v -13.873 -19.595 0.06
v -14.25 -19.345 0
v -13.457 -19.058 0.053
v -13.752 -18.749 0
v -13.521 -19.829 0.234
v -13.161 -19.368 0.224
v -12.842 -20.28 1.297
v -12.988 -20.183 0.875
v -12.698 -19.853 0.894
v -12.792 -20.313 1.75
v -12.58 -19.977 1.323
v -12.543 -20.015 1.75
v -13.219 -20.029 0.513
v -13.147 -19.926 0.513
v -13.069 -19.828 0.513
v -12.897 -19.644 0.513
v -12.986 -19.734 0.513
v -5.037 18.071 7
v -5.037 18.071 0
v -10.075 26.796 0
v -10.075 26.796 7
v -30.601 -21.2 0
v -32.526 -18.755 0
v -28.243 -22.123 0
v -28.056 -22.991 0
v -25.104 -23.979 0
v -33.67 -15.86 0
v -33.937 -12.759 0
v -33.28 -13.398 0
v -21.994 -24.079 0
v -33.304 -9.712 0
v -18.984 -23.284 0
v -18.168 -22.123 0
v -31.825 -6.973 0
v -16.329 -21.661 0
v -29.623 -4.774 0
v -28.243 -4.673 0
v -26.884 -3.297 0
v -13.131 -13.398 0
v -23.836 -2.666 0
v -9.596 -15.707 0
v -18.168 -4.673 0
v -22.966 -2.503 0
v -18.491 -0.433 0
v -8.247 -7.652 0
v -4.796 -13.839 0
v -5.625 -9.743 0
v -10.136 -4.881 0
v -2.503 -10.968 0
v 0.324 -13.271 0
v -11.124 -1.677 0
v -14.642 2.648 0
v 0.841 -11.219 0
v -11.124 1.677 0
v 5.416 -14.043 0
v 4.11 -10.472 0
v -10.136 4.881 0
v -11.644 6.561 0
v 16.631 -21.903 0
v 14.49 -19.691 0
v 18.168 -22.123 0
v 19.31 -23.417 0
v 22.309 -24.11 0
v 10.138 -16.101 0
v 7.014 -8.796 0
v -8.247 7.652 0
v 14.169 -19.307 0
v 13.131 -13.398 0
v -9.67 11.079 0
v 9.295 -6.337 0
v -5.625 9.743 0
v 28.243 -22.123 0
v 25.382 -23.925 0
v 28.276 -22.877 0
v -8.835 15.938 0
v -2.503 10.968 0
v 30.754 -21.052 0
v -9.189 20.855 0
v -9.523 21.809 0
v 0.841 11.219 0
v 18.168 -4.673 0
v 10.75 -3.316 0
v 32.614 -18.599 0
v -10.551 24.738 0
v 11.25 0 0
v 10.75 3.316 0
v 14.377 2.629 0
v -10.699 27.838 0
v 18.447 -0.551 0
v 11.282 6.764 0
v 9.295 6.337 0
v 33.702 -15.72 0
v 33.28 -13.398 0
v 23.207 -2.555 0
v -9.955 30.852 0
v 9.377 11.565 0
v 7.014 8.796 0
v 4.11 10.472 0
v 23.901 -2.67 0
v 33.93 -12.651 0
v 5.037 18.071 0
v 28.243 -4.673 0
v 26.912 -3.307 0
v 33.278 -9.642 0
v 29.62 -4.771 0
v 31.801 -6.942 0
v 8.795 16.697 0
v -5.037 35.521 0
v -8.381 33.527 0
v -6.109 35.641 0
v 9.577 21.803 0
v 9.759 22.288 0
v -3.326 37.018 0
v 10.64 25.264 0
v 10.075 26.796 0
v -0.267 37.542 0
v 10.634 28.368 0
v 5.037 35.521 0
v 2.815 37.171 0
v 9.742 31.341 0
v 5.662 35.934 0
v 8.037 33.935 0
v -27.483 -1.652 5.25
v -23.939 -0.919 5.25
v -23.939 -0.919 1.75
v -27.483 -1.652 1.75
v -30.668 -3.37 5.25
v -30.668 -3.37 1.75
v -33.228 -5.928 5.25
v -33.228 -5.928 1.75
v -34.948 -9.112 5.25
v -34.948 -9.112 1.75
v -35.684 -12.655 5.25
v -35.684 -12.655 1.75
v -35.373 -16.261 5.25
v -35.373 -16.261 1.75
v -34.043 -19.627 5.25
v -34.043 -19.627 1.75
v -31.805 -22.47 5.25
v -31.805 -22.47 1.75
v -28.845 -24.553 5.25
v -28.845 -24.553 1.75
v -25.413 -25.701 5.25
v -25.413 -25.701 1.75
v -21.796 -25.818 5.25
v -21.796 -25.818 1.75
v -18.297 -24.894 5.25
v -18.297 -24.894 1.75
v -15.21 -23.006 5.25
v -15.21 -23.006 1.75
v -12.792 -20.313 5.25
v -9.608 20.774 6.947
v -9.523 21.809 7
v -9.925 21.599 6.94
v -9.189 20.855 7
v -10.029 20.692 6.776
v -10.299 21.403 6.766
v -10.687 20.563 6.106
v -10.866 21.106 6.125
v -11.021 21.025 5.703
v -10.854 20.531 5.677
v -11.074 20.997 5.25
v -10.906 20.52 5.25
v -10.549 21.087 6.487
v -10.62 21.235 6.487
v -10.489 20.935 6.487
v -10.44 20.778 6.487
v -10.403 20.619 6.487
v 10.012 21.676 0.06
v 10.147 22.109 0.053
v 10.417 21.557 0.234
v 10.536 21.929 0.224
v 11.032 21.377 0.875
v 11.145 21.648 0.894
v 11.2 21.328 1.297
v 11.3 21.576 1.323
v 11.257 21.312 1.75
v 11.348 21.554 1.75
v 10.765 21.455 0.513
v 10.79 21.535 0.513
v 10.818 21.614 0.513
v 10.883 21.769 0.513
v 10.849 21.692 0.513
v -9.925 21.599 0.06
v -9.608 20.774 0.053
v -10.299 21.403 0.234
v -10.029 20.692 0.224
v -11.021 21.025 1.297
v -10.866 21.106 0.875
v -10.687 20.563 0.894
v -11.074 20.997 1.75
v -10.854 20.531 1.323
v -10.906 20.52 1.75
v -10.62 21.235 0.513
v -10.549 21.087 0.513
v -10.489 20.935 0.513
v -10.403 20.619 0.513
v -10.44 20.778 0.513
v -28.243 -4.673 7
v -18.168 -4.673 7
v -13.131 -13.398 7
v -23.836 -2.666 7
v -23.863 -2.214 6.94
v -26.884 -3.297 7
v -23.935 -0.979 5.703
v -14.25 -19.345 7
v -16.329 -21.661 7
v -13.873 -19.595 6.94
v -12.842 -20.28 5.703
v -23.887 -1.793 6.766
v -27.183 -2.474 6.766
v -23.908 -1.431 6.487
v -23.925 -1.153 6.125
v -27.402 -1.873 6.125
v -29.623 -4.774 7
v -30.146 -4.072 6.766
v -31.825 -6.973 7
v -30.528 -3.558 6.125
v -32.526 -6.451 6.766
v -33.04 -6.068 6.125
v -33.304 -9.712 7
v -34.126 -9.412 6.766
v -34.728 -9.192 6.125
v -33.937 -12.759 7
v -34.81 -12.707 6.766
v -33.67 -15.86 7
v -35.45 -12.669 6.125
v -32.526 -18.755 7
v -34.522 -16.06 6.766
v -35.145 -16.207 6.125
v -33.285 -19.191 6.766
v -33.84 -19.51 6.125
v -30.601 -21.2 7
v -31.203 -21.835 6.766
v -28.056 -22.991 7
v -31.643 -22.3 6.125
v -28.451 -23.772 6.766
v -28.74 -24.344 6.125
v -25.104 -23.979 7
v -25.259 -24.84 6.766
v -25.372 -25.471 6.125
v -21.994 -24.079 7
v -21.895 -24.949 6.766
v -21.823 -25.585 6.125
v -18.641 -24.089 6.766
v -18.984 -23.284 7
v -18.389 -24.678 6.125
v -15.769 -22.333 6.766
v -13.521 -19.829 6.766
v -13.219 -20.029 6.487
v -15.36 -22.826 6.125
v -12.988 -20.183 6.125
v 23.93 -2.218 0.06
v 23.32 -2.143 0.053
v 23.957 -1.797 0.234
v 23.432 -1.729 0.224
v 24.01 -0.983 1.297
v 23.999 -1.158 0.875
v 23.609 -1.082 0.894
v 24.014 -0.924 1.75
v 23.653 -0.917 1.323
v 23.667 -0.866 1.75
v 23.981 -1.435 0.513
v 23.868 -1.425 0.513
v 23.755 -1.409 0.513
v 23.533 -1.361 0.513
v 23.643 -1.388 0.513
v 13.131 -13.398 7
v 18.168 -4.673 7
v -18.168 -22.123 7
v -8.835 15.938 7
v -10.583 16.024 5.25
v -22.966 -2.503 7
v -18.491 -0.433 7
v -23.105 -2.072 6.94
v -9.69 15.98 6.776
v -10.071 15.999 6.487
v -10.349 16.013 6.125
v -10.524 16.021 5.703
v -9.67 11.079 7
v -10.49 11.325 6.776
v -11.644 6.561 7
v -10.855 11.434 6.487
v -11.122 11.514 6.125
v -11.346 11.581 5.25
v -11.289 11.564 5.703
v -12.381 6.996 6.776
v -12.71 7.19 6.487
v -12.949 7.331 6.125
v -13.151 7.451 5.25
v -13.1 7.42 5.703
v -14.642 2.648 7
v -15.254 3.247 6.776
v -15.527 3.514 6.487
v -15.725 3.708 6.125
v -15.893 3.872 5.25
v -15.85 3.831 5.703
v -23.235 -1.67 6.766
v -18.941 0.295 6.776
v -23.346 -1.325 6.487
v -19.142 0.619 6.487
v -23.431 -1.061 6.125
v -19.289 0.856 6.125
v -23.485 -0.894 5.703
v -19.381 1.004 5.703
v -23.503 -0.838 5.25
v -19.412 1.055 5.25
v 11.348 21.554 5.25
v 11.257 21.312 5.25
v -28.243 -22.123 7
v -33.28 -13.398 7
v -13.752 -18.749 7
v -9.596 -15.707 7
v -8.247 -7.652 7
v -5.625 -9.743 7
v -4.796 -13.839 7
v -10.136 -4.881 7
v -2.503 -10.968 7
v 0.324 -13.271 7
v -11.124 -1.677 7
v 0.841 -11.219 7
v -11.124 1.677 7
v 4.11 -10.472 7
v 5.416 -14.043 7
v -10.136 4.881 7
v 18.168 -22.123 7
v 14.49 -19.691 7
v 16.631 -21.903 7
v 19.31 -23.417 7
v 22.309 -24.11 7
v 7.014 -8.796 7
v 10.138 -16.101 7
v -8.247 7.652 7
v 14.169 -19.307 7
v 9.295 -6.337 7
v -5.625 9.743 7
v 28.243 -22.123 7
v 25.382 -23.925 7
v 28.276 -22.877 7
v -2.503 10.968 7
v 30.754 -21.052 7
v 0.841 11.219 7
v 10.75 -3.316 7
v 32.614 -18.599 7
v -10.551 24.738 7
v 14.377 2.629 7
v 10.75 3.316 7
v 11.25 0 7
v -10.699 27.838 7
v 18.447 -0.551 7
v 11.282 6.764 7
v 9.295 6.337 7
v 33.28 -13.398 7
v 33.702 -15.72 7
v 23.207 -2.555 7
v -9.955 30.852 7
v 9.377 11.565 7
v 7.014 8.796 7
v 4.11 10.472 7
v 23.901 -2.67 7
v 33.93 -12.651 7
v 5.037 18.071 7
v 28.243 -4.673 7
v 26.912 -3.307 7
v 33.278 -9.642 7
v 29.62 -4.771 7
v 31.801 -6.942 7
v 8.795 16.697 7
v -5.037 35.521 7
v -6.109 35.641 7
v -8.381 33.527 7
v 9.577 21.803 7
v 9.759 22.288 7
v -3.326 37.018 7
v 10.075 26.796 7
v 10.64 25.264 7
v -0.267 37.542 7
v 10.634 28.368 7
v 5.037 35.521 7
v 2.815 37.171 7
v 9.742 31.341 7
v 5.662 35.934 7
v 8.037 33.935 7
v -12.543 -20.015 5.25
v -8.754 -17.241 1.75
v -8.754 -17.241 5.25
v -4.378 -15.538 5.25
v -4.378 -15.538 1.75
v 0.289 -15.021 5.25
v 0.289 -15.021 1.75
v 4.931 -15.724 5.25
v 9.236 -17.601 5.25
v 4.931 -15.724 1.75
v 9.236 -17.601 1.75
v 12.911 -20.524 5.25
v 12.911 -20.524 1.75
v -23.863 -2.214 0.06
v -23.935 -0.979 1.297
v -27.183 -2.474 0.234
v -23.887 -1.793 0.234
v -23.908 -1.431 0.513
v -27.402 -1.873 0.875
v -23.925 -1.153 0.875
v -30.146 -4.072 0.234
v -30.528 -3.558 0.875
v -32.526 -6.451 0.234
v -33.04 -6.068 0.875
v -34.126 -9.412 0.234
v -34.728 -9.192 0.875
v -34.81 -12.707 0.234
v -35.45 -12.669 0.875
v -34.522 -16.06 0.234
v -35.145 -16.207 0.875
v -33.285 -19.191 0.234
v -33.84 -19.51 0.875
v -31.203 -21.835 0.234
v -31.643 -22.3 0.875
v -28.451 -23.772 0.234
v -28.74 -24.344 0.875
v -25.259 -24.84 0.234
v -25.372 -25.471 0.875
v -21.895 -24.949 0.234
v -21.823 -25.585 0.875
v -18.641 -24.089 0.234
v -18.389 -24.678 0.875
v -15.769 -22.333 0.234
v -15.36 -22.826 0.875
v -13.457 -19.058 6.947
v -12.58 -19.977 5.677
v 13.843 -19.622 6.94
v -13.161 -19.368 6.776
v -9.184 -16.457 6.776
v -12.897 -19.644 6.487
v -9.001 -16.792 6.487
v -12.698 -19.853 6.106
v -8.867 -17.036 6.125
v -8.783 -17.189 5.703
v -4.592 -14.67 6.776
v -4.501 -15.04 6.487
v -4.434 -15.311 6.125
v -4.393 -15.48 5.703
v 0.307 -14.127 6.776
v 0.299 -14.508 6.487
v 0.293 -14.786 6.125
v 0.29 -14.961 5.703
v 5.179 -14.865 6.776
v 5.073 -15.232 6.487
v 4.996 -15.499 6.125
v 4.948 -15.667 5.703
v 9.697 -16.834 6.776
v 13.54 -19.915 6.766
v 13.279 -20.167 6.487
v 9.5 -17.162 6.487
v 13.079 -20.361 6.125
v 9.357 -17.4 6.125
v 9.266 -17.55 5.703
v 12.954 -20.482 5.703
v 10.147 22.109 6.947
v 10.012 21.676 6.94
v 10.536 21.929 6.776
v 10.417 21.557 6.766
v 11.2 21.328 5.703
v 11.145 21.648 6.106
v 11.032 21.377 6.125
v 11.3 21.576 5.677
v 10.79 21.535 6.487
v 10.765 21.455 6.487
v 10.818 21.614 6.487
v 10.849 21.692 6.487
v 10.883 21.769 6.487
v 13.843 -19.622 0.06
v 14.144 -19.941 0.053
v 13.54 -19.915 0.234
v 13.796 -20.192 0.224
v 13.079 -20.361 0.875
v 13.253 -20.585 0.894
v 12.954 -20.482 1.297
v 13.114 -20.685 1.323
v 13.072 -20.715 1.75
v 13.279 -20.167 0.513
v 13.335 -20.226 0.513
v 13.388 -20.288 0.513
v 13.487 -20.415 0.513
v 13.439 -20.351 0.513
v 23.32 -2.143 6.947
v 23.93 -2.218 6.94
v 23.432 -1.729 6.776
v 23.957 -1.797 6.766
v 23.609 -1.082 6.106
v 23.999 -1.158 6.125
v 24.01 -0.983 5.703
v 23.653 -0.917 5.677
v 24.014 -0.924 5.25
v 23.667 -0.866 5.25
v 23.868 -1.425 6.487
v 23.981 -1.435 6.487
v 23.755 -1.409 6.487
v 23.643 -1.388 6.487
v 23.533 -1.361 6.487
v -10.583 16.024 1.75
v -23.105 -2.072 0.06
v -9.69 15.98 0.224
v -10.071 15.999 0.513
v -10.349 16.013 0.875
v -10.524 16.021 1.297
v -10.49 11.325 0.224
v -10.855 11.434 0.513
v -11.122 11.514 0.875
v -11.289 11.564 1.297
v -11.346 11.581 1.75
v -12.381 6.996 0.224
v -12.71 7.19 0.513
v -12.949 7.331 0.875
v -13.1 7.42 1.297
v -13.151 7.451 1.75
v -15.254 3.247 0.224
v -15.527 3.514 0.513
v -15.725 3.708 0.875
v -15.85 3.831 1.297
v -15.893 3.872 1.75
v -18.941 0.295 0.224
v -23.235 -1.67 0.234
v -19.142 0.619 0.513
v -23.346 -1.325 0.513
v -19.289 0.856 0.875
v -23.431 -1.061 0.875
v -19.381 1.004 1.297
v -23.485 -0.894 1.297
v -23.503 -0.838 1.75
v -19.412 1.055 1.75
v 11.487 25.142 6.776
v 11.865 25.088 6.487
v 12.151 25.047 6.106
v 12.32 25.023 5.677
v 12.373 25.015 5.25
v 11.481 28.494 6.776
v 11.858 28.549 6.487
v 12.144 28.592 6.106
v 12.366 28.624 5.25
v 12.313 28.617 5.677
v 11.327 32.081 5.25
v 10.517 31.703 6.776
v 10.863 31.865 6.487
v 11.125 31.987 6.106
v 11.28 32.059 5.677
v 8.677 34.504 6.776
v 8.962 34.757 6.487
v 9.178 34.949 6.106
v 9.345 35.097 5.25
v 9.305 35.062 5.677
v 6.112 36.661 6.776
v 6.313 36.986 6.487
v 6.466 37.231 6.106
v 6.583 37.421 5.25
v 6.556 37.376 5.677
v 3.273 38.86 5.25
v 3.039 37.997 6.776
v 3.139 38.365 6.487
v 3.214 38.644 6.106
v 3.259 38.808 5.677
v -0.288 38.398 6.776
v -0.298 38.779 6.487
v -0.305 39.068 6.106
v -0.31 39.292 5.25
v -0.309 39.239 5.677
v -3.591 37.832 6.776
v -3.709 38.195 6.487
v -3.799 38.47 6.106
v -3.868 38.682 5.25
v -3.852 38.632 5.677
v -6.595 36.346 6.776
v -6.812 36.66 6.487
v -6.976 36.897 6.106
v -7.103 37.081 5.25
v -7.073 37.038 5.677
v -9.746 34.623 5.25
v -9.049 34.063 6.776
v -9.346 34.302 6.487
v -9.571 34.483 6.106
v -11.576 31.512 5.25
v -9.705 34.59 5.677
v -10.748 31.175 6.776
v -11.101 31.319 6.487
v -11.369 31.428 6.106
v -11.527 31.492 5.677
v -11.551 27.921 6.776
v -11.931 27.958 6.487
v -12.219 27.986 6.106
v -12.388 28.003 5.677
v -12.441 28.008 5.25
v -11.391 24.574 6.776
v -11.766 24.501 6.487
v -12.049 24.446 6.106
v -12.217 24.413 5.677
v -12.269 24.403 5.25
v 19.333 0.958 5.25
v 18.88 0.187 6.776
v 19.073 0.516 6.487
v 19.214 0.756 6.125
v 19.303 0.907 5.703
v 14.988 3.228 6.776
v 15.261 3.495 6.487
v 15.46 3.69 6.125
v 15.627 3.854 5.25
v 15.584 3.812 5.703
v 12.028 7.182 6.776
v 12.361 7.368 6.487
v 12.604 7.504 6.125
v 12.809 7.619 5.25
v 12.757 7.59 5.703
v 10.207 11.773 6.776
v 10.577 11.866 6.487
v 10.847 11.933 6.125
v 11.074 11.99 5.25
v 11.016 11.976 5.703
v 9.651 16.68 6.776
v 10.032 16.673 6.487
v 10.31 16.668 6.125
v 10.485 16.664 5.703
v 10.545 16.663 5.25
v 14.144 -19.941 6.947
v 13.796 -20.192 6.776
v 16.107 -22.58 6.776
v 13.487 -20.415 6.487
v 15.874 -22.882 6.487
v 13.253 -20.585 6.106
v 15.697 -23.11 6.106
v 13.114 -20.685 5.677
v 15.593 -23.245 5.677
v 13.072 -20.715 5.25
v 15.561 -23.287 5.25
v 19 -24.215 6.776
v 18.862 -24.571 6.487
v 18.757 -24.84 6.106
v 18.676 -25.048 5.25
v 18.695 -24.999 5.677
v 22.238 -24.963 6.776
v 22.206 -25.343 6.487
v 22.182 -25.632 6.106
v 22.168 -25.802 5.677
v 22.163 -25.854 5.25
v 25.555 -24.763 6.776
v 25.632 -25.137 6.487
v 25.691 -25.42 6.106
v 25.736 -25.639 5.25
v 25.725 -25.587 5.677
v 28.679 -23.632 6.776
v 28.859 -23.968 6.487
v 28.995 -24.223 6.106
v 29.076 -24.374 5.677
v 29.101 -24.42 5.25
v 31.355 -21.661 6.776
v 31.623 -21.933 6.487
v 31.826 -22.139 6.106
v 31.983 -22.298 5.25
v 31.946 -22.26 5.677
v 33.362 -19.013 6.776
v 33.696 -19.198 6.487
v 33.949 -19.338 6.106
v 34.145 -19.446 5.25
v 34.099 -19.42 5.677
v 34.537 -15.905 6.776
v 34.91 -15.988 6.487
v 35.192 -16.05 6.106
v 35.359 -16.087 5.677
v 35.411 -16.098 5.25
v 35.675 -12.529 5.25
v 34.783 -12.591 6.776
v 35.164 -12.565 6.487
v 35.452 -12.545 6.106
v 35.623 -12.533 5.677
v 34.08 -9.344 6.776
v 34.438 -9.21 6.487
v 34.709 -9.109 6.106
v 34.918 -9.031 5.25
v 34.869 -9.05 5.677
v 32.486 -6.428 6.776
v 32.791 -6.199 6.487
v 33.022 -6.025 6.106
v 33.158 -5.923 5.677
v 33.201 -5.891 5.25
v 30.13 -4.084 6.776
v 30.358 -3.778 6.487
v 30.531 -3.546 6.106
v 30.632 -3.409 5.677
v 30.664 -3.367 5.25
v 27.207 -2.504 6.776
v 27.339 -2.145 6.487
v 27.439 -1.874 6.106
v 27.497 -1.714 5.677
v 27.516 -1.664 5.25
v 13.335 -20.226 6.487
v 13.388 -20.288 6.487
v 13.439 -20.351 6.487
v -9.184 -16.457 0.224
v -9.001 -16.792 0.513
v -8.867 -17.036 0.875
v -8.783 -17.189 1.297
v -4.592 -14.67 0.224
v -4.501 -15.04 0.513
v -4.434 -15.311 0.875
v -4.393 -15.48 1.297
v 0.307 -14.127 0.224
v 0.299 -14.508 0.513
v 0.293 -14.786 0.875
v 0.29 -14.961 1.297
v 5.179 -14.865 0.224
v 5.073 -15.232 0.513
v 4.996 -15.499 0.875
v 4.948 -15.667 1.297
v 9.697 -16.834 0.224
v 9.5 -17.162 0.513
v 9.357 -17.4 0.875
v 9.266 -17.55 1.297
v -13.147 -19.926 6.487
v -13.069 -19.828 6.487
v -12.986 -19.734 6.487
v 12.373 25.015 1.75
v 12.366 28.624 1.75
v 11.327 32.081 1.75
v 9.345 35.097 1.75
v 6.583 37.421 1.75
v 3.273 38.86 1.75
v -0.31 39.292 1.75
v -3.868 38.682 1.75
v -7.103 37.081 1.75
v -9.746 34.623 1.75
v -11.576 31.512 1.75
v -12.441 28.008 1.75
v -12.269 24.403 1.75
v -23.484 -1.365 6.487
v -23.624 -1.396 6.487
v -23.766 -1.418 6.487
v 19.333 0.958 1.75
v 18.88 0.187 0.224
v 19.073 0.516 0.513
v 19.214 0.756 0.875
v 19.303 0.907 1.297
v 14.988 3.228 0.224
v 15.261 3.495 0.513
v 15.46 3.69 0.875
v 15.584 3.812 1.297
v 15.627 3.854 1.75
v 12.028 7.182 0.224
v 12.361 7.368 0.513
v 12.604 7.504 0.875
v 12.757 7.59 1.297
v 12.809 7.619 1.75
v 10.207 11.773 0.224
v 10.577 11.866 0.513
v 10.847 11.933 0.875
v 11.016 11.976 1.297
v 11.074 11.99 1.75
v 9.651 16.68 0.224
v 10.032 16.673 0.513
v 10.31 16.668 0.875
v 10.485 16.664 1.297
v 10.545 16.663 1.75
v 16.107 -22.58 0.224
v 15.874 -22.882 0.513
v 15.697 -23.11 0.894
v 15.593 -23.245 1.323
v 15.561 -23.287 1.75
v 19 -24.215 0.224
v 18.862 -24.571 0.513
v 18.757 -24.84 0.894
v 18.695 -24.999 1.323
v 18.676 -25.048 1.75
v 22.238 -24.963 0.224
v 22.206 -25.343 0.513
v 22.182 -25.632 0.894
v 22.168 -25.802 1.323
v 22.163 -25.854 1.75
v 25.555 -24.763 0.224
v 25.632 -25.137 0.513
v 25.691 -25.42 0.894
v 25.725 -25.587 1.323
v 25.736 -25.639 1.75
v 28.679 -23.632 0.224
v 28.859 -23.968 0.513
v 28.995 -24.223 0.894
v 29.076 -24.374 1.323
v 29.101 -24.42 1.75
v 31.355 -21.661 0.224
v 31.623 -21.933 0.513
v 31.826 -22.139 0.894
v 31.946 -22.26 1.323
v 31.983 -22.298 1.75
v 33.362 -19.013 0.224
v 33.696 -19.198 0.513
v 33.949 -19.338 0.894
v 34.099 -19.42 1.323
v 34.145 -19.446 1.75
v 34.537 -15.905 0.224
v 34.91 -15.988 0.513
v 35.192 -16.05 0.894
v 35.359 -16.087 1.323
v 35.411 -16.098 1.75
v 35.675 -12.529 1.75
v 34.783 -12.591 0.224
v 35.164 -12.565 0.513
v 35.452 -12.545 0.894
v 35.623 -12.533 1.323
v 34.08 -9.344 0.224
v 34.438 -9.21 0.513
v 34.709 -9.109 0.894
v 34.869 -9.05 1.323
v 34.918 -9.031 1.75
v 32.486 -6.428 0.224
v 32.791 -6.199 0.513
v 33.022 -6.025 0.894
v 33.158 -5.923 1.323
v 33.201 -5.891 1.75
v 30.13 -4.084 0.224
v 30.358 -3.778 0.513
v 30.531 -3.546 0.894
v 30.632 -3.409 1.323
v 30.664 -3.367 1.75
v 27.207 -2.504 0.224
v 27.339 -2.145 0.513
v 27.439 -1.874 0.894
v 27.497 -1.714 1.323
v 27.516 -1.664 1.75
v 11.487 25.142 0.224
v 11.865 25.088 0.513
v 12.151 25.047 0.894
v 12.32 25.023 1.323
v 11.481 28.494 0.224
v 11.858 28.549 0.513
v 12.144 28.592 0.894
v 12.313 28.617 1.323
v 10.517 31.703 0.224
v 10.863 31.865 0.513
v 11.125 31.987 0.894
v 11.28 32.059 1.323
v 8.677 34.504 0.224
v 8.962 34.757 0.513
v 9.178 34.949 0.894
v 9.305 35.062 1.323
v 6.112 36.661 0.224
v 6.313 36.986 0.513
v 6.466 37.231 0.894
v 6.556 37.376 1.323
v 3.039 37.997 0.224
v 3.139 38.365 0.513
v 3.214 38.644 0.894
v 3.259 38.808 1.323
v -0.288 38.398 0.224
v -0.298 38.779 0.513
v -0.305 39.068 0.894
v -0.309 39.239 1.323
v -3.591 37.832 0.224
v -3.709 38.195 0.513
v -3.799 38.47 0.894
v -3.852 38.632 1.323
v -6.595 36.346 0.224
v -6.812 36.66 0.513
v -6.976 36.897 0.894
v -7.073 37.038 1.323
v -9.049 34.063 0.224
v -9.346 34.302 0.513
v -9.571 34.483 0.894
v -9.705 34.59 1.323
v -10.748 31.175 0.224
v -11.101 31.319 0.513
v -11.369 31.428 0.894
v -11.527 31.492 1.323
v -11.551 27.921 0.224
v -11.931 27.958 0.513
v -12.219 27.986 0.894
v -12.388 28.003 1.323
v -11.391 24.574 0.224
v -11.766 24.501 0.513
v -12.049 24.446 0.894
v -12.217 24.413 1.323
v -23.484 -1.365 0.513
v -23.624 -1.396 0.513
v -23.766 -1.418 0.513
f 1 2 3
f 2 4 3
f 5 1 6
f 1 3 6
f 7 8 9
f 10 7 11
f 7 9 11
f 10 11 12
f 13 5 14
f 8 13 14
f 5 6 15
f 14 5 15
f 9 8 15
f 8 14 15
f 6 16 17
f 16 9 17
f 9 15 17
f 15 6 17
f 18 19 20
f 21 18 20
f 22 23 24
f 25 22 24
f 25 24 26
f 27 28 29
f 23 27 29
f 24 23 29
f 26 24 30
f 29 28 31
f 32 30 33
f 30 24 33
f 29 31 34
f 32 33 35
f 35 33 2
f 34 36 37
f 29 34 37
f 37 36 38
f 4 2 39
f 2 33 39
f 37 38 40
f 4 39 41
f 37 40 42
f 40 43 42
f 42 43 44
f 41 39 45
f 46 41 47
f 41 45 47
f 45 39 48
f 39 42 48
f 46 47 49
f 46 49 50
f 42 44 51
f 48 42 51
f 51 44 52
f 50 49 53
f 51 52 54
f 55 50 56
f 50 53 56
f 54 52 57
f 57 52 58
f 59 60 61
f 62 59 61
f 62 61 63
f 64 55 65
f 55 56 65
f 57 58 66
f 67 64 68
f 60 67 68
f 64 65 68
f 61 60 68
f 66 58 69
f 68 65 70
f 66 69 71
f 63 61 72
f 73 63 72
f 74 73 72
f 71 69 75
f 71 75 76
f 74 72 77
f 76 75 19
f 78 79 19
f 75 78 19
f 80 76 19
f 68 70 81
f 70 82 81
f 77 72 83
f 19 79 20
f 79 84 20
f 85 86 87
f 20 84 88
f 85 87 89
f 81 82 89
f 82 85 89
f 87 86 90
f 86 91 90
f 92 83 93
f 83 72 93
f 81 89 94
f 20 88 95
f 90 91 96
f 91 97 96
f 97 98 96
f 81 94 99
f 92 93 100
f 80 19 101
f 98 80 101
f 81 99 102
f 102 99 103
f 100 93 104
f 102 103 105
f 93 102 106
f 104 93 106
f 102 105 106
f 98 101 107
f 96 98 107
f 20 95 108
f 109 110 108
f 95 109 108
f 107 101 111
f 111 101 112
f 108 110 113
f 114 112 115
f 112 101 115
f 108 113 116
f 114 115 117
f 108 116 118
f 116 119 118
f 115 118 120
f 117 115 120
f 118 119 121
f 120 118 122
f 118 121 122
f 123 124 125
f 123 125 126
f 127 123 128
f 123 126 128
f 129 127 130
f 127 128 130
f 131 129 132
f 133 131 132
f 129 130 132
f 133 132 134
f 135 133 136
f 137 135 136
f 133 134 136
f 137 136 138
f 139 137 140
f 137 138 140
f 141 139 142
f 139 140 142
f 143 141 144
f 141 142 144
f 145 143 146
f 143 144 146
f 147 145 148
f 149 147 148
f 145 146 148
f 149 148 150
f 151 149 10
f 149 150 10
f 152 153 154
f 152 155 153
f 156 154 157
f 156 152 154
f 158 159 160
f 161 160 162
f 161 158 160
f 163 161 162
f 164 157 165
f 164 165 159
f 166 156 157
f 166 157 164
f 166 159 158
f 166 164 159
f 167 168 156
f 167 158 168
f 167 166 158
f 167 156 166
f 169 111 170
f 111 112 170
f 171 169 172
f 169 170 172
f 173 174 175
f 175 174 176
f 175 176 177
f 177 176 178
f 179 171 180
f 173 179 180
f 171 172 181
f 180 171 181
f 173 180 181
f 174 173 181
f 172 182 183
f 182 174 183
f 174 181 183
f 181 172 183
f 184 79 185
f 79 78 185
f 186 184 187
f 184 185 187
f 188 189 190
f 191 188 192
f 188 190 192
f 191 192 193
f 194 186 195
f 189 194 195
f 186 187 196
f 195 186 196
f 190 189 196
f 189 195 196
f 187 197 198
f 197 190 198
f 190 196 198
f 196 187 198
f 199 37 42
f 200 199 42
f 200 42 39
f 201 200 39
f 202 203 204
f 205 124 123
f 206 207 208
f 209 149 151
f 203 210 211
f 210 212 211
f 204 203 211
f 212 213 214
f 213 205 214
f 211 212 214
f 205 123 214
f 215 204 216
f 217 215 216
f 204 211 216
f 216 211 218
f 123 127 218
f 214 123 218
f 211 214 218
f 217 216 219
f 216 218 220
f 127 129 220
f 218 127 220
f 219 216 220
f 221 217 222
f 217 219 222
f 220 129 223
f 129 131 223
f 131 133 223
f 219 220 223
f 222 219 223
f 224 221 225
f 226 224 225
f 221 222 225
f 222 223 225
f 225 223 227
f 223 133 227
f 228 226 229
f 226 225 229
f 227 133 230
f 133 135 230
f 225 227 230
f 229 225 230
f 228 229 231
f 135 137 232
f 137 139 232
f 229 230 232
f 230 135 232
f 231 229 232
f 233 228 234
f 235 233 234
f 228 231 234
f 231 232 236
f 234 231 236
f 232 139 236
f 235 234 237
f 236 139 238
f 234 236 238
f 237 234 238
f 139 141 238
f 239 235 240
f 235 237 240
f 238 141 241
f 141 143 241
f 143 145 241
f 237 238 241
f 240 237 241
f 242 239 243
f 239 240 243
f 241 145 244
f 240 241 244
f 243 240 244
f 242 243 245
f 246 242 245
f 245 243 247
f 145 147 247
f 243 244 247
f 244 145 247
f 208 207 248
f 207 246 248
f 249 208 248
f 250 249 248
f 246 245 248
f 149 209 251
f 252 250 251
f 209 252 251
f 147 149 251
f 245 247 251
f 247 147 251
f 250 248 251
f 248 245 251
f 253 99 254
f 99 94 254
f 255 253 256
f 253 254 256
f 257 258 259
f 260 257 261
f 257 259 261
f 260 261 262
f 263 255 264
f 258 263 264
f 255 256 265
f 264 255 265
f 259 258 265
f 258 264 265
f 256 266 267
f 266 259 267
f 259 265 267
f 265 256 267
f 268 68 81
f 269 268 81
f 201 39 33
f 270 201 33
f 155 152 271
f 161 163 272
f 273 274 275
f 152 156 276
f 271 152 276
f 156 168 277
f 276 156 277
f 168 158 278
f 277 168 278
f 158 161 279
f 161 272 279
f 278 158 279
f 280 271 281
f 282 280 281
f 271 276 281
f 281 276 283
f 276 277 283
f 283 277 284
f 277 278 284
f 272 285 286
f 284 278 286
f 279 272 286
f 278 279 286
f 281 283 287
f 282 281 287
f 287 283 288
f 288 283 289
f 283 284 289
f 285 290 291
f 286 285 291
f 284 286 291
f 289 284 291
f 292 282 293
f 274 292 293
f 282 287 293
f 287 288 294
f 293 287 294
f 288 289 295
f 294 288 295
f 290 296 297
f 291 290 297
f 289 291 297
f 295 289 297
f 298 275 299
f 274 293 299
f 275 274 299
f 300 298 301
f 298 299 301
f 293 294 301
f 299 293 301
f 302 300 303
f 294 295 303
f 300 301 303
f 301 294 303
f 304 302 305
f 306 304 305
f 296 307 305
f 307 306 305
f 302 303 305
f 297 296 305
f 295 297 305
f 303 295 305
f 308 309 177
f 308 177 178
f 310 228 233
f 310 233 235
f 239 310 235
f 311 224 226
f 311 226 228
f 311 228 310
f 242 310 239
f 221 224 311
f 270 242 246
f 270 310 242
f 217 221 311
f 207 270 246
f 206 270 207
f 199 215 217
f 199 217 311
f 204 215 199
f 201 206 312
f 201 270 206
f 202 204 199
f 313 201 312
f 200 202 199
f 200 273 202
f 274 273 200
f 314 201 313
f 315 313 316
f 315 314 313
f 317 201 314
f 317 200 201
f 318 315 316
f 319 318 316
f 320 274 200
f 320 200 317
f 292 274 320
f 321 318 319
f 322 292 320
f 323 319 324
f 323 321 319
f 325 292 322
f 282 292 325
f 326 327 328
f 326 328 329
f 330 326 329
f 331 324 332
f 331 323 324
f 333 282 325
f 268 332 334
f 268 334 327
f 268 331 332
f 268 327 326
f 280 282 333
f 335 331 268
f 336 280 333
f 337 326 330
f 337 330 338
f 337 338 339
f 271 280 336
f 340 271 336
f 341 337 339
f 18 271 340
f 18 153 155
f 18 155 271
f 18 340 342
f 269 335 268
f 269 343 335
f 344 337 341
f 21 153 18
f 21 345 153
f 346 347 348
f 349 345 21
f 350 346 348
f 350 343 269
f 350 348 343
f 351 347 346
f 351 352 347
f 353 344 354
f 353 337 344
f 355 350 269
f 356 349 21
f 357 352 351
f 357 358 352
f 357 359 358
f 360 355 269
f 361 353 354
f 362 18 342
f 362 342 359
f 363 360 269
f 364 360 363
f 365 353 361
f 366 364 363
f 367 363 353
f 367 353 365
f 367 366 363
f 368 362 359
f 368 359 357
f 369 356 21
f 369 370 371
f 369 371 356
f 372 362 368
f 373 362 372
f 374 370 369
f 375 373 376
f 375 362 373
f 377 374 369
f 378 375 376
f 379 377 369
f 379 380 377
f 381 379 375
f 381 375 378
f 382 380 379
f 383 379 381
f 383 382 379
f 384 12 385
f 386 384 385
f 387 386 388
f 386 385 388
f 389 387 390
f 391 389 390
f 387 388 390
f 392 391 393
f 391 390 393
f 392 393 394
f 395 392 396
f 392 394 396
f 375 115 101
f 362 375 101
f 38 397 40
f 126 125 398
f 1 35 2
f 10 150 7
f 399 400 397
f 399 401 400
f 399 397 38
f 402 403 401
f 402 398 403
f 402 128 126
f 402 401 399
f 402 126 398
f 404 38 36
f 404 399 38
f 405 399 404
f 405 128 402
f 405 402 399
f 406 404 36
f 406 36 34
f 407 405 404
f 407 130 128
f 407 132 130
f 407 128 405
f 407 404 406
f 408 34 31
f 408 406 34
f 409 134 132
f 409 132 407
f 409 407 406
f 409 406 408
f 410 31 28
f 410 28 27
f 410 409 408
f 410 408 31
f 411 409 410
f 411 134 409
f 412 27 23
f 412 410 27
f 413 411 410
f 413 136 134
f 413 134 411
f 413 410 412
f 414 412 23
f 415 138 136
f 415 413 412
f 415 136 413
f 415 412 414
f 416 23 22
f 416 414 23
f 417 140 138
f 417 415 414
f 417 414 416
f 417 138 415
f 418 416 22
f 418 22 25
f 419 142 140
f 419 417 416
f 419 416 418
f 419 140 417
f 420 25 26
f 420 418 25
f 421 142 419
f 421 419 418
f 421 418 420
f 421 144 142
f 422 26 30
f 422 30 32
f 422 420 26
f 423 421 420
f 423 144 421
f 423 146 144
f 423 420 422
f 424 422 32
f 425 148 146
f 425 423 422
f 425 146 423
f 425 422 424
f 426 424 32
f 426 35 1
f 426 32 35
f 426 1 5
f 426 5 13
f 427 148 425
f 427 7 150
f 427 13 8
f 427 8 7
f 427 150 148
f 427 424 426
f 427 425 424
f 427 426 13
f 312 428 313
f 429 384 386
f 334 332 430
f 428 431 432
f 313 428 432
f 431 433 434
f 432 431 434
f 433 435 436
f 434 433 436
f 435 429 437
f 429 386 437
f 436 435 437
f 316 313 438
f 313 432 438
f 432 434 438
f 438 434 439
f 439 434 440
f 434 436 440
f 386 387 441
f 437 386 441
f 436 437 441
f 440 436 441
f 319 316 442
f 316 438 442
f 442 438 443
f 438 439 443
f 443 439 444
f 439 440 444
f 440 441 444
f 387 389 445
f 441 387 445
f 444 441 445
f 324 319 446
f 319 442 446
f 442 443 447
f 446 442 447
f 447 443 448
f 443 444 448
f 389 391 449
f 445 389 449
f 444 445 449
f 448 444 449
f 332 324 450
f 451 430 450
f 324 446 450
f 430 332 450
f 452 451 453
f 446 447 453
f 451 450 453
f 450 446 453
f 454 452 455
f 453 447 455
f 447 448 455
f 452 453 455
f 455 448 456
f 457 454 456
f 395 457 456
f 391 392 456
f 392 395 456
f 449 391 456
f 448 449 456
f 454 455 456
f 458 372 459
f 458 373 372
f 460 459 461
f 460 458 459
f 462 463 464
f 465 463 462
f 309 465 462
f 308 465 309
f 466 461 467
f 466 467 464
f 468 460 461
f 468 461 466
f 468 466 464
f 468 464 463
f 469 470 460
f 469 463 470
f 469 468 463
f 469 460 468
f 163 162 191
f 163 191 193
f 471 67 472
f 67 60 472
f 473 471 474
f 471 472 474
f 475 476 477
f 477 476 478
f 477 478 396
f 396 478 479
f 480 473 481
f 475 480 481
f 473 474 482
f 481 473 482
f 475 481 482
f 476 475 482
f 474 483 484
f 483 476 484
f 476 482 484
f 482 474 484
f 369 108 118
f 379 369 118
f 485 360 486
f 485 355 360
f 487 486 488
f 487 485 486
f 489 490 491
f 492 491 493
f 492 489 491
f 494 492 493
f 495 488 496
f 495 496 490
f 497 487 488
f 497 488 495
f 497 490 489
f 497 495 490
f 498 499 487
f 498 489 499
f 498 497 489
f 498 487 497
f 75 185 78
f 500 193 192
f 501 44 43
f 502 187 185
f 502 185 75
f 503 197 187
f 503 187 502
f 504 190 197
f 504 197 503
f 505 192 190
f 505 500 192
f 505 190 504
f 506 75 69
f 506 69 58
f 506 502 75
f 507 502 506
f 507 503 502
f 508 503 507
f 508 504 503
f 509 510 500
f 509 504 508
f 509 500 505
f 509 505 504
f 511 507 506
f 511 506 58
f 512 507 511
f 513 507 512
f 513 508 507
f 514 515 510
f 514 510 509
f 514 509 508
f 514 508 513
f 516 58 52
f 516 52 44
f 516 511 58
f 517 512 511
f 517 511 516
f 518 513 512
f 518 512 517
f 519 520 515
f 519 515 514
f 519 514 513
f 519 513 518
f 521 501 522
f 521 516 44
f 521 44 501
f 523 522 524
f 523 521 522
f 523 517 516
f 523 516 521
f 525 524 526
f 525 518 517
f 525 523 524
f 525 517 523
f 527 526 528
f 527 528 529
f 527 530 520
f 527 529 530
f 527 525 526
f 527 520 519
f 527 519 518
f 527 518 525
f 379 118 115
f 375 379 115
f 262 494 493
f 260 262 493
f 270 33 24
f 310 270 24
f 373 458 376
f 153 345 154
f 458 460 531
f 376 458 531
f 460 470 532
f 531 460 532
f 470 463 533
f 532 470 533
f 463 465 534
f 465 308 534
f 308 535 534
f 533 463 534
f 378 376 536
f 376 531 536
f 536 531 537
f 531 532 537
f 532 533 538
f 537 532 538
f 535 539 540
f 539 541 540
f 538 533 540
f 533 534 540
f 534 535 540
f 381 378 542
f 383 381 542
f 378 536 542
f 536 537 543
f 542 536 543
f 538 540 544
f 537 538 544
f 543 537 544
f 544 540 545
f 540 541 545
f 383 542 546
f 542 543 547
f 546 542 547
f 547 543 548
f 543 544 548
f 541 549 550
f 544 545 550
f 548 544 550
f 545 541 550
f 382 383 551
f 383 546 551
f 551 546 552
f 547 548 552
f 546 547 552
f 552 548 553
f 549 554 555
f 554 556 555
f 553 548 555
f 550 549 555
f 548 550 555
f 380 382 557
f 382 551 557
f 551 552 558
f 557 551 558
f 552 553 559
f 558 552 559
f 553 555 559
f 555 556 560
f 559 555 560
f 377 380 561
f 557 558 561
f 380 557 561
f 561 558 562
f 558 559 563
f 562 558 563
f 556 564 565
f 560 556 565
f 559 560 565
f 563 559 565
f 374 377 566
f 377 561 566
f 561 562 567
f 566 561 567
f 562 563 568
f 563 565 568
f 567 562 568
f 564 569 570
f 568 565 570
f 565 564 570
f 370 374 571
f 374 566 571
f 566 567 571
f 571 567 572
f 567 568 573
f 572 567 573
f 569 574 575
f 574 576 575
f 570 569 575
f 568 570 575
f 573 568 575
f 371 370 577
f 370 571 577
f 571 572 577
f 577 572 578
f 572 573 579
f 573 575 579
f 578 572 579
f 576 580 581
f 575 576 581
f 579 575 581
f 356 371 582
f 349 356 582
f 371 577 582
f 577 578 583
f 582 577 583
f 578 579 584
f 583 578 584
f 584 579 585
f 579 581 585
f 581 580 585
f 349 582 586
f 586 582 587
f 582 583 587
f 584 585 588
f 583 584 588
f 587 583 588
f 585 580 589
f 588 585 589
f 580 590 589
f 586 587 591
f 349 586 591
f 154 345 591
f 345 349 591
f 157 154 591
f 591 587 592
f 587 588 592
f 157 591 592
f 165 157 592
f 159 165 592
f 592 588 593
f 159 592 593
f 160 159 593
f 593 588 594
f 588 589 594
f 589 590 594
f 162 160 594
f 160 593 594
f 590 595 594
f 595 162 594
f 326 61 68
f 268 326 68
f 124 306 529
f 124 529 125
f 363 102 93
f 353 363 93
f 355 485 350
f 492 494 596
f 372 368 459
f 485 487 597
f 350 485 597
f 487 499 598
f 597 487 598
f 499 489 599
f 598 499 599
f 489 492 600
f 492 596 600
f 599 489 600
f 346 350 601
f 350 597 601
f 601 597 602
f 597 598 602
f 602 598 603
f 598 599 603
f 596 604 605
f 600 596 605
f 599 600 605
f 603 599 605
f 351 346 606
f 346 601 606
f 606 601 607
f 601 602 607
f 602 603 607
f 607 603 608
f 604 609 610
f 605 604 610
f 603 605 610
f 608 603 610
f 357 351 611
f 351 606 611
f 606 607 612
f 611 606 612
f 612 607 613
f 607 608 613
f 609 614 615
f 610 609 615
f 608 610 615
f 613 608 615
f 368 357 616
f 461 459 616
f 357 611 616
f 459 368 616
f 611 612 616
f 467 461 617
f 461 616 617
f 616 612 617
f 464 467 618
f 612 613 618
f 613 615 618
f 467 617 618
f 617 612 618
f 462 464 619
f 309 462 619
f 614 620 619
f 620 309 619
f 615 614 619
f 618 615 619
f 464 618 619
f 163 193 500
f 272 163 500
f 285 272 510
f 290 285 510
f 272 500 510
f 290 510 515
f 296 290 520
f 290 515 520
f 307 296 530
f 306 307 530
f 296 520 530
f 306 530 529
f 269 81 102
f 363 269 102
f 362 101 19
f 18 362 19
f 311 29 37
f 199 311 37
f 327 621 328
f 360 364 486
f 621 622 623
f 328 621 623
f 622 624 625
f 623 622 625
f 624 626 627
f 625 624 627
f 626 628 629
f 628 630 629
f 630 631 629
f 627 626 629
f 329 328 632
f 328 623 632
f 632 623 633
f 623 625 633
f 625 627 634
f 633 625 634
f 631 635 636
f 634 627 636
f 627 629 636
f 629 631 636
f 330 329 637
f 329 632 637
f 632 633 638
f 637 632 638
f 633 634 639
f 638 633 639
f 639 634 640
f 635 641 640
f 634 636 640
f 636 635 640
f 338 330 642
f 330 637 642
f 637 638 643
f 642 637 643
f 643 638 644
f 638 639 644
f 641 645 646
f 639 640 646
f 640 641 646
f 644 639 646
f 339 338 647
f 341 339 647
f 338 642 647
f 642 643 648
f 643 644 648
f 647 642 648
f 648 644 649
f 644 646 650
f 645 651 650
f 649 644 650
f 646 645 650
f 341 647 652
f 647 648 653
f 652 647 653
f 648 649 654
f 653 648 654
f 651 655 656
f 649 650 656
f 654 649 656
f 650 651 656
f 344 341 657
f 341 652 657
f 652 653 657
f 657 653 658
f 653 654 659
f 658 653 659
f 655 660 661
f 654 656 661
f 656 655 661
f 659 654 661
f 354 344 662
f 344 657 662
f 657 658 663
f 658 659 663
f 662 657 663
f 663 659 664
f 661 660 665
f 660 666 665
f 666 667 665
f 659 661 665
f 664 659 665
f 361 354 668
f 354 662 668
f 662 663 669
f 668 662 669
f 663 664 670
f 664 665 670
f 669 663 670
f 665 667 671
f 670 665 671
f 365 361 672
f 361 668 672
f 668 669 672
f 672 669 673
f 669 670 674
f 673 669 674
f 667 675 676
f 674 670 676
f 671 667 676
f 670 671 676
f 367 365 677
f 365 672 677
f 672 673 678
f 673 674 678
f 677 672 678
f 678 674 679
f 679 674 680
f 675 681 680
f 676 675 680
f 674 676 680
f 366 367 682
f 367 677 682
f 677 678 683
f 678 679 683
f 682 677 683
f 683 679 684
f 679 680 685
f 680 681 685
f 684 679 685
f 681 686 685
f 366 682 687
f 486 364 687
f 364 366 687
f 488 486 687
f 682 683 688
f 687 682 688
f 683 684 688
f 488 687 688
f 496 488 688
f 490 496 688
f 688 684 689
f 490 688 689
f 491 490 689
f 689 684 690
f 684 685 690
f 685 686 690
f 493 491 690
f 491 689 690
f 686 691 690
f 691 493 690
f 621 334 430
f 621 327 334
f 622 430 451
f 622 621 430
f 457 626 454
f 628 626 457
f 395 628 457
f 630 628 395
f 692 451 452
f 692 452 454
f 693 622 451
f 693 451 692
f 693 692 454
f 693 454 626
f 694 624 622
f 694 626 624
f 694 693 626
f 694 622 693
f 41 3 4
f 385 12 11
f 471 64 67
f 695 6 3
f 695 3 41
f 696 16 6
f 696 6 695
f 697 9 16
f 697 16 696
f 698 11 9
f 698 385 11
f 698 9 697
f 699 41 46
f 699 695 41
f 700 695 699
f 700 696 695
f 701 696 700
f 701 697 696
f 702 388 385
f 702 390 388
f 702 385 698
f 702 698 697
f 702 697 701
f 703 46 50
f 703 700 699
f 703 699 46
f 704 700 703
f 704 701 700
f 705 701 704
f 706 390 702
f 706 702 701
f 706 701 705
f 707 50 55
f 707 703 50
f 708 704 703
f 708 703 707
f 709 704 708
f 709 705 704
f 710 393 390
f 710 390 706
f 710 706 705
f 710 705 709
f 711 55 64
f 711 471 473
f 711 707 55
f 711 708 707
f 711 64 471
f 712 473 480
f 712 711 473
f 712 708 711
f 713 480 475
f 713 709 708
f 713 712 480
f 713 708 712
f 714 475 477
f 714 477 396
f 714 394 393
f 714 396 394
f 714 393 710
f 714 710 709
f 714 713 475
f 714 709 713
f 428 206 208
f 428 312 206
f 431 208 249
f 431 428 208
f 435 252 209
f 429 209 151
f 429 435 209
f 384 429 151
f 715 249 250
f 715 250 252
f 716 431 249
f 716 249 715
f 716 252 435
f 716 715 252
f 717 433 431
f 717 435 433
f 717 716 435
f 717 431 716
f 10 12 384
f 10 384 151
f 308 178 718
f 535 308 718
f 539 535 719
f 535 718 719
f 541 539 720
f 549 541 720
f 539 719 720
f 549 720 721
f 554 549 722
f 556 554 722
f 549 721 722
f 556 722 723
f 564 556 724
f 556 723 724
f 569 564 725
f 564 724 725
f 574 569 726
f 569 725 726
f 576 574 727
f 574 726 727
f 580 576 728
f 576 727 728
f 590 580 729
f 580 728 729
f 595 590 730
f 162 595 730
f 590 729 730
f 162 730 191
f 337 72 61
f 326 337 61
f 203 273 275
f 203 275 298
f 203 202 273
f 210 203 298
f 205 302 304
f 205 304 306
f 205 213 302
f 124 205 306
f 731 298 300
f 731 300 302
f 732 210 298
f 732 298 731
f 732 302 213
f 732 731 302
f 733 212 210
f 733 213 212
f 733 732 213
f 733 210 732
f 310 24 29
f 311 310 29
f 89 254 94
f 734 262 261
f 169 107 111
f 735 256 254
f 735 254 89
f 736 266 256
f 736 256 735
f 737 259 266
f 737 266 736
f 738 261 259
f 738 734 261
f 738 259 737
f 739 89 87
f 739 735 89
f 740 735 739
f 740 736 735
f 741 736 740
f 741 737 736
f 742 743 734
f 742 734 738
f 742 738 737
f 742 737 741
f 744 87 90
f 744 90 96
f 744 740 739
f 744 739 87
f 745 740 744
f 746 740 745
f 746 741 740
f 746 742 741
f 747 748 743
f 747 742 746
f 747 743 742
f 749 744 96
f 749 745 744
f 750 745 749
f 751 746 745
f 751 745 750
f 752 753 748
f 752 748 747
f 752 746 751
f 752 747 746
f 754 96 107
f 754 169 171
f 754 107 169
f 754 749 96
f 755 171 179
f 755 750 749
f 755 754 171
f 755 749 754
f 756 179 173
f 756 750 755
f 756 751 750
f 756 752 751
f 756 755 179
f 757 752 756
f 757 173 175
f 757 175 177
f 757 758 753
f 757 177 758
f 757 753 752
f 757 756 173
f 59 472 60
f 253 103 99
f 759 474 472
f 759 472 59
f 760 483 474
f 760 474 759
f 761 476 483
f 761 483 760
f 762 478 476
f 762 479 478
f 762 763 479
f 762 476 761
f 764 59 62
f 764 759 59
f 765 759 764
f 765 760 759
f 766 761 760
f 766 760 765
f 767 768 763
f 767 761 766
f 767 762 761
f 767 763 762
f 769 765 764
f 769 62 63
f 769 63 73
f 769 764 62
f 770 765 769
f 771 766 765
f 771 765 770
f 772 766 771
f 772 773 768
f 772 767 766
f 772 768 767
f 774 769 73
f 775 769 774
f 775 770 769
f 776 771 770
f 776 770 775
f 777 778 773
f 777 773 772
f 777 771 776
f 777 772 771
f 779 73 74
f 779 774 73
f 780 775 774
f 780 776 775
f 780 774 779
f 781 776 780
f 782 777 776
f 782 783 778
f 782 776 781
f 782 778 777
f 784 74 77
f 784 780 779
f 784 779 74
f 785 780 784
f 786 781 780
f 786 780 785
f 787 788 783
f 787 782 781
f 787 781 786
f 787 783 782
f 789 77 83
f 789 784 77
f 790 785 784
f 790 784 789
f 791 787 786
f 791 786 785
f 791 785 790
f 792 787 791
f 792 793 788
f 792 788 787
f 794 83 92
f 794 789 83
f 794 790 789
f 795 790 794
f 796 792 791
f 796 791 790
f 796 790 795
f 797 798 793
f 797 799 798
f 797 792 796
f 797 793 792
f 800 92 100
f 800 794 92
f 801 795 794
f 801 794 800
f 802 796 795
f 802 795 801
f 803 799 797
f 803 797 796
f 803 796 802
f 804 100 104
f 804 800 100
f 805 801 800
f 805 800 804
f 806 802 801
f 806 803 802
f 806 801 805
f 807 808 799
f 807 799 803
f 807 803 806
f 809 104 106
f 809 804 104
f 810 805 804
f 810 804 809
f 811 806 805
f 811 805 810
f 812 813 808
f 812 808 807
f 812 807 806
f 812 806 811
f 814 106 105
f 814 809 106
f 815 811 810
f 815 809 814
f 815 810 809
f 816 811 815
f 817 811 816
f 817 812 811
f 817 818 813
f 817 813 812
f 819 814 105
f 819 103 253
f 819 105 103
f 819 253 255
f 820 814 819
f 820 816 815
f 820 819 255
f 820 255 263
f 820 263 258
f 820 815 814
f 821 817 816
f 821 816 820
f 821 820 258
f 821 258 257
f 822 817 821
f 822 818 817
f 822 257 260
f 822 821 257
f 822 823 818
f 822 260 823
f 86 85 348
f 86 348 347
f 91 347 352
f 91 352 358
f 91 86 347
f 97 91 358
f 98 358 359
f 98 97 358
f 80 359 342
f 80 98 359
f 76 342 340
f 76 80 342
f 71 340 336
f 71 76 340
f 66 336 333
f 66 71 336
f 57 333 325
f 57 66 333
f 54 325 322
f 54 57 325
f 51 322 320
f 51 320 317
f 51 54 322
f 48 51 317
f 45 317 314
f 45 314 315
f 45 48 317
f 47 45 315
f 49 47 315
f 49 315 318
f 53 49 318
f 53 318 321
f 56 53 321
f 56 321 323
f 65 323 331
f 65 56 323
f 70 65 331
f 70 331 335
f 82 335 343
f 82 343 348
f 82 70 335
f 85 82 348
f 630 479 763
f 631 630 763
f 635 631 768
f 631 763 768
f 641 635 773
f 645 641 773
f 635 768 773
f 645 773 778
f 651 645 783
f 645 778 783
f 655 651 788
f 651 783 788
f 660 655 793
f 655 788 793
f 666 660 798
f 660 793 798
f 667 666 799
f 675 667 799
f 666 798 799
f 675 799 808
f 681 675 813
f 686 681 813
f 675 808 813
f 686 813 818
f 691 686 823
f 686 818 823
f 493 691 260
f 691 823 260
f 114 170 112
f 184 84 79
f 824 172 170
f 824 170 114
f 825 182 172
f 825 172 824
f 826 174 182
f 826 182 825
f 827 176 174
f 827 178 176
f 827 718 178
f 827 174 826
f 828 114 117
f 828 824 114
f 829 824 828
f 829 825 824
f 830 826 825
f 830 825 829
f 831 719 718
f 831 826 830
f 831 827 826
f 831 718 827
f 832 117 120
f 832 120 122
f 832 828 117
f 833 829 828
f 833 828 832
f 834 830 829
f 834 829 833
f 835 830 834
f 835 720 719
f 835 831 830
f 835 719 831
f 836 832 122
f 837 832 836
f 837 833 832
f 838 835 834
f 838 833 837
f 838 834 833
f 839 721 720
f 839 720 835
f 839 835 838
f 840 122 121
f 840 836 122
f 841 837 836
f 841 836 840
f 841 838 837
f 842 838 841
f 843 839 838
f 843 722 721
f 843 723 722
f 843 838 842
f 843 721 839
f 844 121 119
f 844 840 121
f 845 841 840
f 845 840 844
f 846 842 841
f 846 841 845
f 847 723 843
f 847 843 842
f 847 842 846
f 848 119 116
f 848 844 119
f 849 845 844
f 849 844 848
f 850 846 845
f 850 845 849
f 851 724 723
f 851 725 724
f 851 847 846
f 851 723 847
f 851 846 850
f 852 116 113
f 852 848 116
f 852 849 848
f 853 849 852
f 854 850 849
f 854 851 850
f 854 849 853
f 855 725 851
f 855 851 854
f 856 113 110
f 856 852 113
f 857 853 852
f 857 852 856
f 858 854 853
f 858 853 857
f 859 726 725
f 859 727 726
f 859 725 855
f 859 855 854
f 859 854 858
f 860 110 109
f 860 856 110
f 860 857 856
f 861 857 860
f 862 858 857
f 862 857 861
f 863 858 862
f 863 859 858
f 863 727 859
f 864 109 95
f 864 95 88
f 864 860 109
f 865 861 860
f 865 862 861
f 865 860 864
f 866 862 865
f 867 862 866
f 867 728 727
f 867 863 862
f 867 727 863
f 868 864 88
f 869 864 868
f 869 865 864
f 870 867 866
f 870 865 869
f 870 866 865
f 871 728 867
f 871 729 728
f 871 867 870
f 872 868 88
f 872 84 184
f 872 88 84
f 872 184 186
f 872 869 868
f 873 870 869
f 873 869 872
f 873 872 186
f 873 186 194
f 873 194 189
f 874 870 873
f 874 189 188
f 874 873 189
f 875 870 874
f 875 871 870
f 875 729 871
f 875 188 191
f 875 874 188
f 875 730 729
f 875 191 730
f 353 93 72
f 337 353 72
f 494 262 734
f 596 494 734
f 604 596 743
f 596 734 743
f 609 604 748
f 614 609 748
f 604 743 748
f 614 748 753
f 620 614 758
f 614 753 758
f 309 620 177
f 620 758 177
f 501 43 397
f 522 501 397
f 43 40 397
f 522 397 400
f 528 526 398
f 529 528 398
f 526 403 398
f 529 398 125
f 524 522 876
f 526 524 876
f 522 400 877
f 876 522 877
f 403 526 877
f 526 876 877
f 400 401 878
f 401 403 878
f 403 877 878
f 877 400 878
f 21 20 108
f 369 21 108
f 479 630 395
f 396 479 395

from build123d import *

# Parameters (mm, degrees)
F0_R     = 11.25
F1_DEPTH = 7
F2_F1_R  = 1.75
F2_F2_R  = 1.75


# Not quite as in the source:
# - a feature names something its author has since deleted; it is built from what else it names


with BuildPart() as f1:
    # F0 (on Top) → F1 (new body)
    with BuildSketch(Plane.XY):
        with BuildLine():
            ThreePointArc((23.8479882297, -0.9143272054), (12.8207682574, 7.5970822448), (11.2961561087, 21.4433535458))
            ThreePointArc((11.2961561087, 21.4433535458), (-0.3696422444, 39.2901628216), (-10.9599899611, 20.7849206513))
            ThreePointArc((-10.9599899611, 20.7849206513), (-13.1426262864, 7.4651290037), (-23.7284148542, -0.908748907))
            ThreePointArc((-23.7284148542, -0.908748907), (-34.0498321112, -19.6151057374), (-12.6918356784, -20.1586390273))
            ThreePointArc((-12.6918356784, -20.1586390273), (0.2517315357, -15.0201868131), (13.0027753206, -20.6193390506))
            ThreePointArc((13.0027753206, -20.6193390506), (34.1566443936, -19.4249802921), (23.8479882297, -0.9143272054))
        make_face()
        Polygon((-13.1309336016, -13.3978147163), (-18.1683147003, -22.1228147163), (-28.2430768977, -22.1228147163), (-33.2804579963, -13.3978147163), (-28.2430768977, -4.6728147163), (-18.1683147003, -4.6728147163), align=None, mode=Mode.SUBTRACT)
        Polygon((18.1683147003, -4.6728147163), (28.2430768977, -4.6728147163), (33.2804579963, -13.3978147163), (28.2430768977, -22.1228147163), (18.1683147003, -22.1228147163), (13.1309336016, -13.3978147163), align=None, mode=Mode.SUBTRACT)
        Circle(F0_R, mode=Mode.SUBTRACT)
        Polygon((-5.0373810987, 35.5206294325), (5.0373810987, 35.5206294325), (10.0747621974, 26.7956294325), (5.0373810987, 18.0706294325), (-5.0373810987, 18.0706294325), (-10.0747621974, 26.7956294325), align=None, mode=Mode.SUBTRACT)
    extrude(amount=F1_DEPTH)

    # F2: fillet of radius 1.75 on 14 edges, made by hand

    # F2_f1
    f2_f1_edges = [f1.edges().sort_by_distance(p)[0] for p in [
        (13.0027753206, -20.6193390506, 3.5),
        (23.8479882297, -0.9143272054, 3.5),
        (11.2961561087, 21.4433535458, 3.5),
        (-10.9599899611, 20.7849206513, 3.5),
        (-23.7284148542, -0.908748907, 3.5),
        (-12.6918356784, -20.1586390273, 3.5),
    ]]
    fillet(f2_f1_edges, radius=F2_F1_R)

    # F2_f2
    f2_f2_edges = [f1.edges().sort_by_distance(p)[0] for p in [
        (-34.043255935, -19.6265618053, 0),
        (-34.043255935, -19.6265618053, 7),
        (-23.7183868319, -0.8923048018, 7),
        (-12.6760959015, -20.1569074189, 7),
        (-23.7183868319, -0.8923048018, 0),
        (-12.6760959015, -20.1569074189, 0),
    ]]
    fillet(f2_f2_edges, radius=F2_F2_R)


solid = f1.part
